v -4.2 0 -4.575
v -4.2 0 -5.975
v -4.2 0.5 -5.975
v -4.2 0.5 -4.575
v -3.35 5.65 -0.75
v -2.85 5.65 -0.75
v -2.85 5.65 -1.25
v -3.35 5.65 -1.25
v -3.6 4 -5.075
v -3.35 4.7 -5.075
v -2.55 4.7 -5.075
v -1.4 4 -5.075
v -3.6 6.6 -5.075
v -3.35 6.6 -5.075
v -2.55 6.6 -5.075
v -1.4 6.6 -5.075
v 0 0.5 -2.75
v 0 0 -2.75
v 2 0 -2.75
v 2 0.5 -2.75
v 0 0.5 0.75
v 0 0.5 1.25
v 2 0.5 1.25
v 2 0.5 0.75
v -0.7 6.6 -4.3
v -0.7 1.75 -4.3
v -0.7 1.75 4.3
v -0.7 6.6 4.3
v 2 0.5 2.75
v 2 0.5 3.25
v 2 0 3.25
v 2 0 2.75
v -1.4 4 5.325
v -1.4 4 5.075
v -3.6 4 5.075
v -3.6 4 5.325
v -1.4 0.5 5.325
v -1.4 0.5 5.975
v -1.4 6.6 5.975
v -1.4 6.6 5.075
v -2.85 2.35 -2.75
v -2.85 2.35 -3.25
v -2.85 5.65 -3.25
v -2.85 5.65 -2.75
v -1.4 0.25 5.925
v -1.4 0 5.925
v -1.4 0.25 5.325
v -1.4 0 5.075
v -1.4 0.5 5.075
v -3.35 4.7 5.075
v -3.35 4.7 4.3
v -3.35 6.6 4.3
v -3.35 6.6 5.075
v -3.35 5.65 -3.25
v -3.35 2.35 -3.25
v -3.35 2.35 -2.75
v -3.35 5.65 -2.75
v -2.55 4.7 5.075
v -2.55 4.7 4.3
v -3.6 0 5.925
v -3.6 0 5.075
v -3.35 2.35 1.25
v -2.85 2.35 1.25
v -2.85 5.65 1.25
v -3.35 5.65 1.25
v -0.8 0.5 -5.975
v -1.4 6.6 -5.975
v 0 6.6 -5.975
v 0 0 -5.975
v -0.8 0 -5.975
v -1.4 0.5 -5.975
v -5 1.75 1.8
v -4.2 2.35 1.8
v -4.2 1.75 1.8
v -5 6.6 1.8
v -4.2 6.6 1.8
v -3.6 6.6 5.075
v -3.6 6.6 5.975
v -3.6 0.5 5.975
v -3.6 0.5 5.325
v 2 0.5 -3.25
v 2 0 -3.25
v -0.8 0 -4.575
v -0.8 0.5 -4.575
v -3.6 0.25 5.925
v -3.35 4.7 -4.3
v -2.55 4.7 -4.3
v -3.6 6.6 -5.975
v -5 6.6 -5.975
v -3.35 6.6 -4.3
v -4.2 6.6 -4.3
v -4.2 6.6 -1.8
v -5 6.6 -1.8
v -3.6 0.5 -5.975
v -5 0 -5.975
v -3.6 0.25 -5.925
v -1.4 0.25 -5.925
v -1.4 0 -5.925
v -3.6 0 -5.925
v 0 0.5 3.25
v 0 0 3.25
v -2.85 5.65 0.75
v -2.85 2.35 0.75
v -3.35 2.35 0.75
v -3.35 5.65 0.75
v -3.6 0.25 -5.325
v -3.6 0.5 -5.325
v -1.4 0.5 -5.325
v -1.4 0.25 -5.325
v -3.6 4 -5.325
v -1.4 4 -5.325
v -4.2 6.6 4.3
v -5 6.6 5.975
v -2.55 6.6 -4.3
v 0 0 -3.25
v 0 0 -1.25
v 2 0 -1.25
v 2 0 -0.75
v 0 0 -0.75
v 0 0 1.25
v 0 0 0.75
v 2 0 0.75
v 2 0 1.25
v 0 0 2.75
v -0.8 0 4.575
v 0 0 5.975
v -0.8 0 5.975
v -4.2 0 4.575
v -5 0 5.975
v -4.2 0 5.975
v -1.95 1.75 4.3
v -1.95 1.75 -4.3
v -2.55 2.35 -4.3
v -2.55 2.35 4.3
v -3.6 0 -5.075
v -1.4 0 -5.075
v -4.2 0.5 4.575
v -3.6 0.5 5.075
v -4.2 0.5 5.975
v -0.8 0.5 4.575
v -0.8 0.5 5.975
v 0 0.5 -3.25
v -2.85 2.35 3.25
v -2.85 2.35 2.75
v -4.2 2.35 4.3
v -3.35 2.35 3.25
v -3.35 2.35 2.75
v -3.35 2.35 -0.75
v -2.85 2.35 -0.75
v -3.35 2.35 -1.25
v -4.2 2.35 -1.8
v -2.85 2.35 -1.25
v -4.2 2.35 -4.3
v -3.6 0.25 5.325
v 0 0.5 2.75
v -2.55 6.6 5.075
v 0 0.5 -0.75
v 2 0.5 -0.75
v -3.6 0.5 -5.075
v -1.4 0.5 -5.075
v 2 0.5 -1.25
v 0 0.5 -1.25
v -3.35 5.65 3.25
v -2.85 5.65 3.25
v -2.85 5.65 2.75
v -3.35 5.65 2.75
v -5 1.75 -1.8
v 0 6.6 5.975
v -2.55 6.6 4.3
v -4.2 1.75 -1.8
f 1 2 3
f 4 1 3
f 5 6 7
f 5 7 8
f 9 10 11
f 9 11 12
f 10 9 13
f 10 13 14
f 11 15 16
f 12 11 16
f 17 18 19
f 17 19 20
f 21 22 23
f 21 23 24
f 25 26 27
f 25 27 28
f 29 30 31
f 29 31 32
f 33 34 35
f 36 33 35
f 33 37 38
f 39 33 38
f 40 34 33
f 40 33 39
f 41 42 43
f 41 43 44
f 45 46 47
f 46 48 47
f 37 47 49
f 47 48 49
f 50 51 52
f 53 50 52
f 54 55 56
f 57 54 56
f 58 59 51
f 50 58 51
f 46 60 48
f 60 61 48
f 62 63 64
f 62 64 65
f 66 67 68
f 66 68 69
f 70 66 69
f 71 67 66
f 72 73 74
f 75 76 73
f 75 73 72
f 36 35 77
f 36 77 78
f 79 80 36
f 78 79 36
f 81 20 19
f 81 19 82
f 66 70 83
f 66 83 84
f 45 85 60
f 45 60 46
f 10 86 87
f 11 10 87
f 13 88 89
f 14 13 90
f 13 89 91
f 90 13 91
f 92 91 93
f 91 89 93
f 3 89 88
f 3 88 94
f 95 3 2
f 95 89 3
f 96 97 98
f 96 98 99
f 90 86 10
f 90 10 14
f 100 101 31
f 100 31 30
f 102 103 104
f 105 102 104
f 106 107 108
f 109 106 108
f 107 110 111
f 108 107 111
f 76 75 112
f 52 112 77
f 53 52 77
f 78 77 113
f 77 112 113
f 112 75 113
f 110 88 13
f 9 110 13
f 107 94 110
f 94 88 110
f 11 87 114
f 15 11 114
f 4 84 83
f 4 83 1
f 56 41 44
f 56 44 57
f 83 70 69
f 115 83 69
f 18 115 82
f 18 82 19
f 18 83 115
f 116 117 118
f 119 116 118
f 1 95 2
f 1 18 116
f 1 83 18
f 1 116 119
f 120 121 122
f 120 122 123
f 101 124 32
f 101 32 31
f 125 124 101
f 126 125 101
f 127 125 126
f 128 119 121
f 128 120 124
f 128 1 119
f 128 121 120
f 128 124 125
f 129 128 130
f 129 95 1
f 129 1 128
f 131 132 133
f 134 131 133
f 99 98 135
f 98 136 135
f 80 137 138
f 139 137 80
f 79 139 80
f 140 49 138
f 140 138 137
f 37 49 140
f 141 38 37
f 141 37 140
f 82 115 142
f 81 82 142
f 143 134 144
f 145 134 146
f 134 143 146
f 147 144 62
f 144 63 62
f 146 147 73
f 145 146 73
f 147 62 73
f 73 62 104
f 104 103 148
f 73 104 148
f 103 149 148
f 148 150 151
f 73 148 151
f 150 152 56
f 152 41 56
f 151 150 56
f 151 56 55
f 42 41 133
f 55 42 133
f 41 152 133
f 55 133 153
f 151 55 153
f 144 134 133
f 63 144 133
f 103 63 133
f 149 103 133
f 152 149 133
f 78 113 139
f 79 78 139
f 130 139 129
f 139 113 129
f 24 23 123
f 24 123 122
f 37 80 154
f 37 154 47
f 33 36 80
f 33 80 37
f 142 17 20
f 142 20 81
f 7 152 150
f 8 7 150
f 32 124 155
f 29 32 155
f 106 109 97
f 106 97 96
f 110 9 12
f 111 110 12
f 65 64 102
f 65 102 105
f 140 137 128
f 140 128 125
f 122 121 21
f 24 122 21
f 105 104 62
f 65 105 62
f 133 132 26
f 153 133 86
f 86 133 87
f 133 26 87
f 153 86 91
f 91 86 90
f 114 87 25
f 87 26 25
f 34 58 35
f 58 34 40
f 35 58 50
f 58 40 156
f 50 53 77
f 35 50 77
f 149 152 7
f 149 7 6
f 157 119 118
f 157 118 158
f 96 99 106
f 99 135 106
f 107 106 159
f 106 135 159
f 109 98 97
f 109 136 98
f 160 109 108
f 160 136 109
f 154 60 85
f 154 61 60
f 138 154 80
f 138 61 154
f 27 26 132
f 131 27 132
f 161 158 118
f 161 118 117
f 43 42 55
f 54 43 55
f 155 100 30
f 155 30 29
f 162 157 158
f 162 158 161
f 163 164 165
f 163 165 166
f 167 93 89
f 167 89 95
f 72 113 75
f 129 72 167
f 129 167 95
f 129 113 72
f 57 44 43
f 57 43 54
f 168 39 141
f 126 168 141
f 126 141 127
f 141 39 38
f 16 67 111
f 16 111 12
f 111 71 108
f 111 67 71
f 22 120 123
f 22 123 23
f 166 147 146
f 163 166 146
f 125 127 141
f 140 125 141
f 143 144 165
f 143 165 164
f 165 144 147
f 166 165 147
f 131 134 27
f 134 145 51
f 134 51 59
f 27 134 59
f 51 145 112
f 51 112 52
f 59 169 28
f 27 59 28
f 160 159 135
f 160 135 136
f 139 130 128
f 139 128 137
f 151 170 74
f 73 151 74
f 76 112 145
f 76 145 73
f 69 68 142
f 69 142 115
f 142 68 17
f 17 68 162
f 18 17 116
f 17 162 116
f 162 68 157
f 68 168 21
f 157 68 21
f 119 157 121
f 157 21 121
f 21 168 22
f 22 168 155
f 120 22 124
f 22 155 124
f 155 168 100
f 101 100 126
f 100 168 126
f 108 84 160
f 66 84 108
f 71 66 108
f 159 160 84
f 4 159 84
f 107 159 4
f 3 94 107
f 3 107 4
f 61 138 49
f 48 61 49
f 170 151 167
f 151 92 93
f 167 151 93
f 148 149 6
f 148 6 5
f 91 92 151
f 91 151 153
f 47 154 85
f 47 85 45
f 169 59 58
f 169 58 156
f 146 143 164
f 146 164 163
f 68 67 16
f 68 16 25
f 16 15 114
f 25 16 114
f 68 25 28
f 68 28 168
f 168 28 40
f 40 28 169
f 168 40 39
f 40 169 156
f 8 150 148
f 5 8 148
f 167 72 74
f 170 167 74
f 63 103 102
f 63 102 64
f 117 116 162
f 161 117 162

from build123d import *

# Parameters (mm, degrees)
SKETCH1_W            = 6.6
SKETCH1_H            = 11.95
BOSS_EXTRUDE1_DEPTH  = 5
SKETCH2_W            = 3.4
SKETCH2_H            = 0.5
CUT_EXTRUDE1_DEPTH   = 1.4
SKETCH3_W            = 2.2
SKETCH3_H            = 0.65
CUT_EXTRUDE2_DEPTH   = 7.1
SKETCH4_W            = 2.2
SKETCH4_H            = 0.25
BOSS_EXTRUDE2_DEPTH  = 0.5
SKETCH5_W            = 2.2
SKETCH5_H            = 0.25
BOSS_EXTRUDE3_DEPTH  = 0.6
SKETCH6_W            = 3.4
SKETCH6_H            = 0.5
CUT_EXTRUDE3_DEPTH   = 1.4
SKETCH7_W            = 2.2
SKETCH7_H            = 0.65
CUT_EXTRUDE4_DEPTH   = 7.1
SKETCH8_W            = 2.2
SKETCH8_H            = 0.25
BOSS_EXTRUDE4_DEPTH  = 0.5
SKETCH9_W            = 2.2
SKETCH9_H            = 0.25
BOSS_EXTRUDE5_DEPTH  = 0.6
CUT_EXTRUDE5_DEPTH   = 3.6
CUT_EXTRUDE6_REACH   = 2.9
SKETCH12_W           = 2.2
SKETCH12_H           = 2.6
CUT_EXTRUDE7_REACH   = 12.275
SKETCH13_W           = 1.85
SKETCH13_H           = 4.85
SKETCH14_W           = 2.5
SKETCH14_H           = 4.25
CUT_EXTRUDE8_DEPTH   = 1.65
CUT_EXTRUDE9_REACH   = 2.9
SKETCH16_W           = 2.2
SKETCH16_H           = 2.6
CUT_EXTRUDE10_REACH  = 12.275
SKETCH17_W           = 1.85
SKETCH17_H           = 4.85
SKETCH18_W           = 2.5
SKETCH18_H           = 4.25
CUT_EXTRUDE11_DEPTH  = 1.65
CUT_EXTRUDE12_REACH  = 6.85
SKETCH20_W           = 0.8
SKETCH20_H           = 3.6
SKETCH21_W           = 0.8
SKETCH21_H           = 1.9
CUT_EXTRUDE13_DEPTH  = 2.675
SKETCH22_W           = 0.8
SKETCH22_H           = 1.9
CUT_EXTRUDE14_DEPTH  = 2.675
SKETCH23_W           = 0.5
SKETCH23_H           = 0.5
BOSS_EXTRUDE6_DEPTH  = 2
SKETCH24_W           = 0.5
SKETCH24_H           = 0.5
BOSS_EXTRUDE7_DEPTH  = 2
SKETCH25_W           = 0.5
SKETCH25_H           = 0.5
BOSS_EXTRUDE8_DEPTH  = 2
SKETCH26_W           = 0.5
SKETCH26_H           = 0.5
BOSS_EXTRUDE9_DEPTH  = 2
SKETCH27_W           = 0.5
SKETCH27_H           = 0.5
BOSS_EXTRUDE10_DEPTH = 3.3
SKETCH28_W           = 0.5
SKETCH28_H           = 0.5
BOSS_EXTRUDE11_DEPTH = 3.3
SKETCH29_W           = 0.5
SKETCH29_H           = 0.5
BOSS_EXTRUDE12_DEPTH = 3.3
SKETCH30_W           = 0.5
SKETCH30_H           = 0.5
BOSS_EXTRUDE13_DEPTH = 3.3
DRAFT1_ANGLE         = 45


with BuildPart() as part:
    # Sketch1 → Boss-Extrude1 (new body)
    with BuildSketch(Plane(origin=(-5, 0, 0), x_dir=(0, -1, 0), z_dir=(-1, 0, 0))):
        with Locations((-3.3, 0)):
            Rectangle(SKETCH1_W, SKETCH1_H)
    extrude(amount=-BOSS_EXTRUDE1_DEPTH)

    # Sketch2 → Cut-Extrude1 (cut)
    with BuildSketch(Plane.XY.offset(5.975)):
        with Locations((-2.5, 0.25)):
            Rectangle(SKETCH2_W, SKETCH2_H)
    extrude(amount=-CUT_EXTRUDE1_DEPTH, mode=Mode.SUBTRACT)

    # Sketch3 → Cut-Extrude2 (cut, through all)
    with BuildSketch(Plane.XZ.offset(-0.5)):
        with Locations((-2.5, 5.65)):
            Rectangle(SKETCH3_W, SKETCH3_H)
    extrude(amount=-CUT_EXTRUDE2_DEPTH, mode=Mode.SUBTRACT)

    # Sketch4 → Boss-Extrude2 (add)
    with BuildSketch(Plane.XZ.offset(-0.5)):
        with Locations((-2.5, 5.2)):
            Rectangle(SKETCH4_W, SKETCH4_H)
    extrude(amount=BOSS_EXTRUDE2_DEPTH)

    # Sketch5 → Boss-Extrude3 (add)
    with BuildSketch(Plane.XY.offset(5.325)):
        with Locations((-2.5, 0.125)):
            Rectangle(SKETCH5_W, SKETCH5_H)
    extrude(amount=BOSS_EXTRUDE3_DEPTH)

    # Sketch6 → Cut-Extrude3 (cut)
    with BuildSketch(Plane(origin=(0, 0, -5.975), x_dir=(-1, 0, 0), z_dir=(0, 0, -1))):
        with Locations((2.5, 0.25)):
            Rectangle(SKETCH6_W, SKETCH6_H)
    extrude(amount=-CUT_EXTRUDE3_DEPTH, mode=Mode.SUBTRACT)

    # Sketch7 → Cut-Extrude4 (cut, through all)
    with BuildSketch(Plane.XZ.offset(-0.5)):
        with Locations((-2.5, -5.65)):
            Rectangle(SKETCH7_W, SKETCH7_H)
    extrude(amount=-CUT_EXTRUDE4_DEPTH, mode=Mode.SUBTRACT)

    # Sketch8 → Boss-Extrude4 (add)
    with BuildSketch(Plane.XZ.offset(-0.5)):
        with Locations((-2.5, -5.2)):
            Rectangle(SKETCH8_W, SKETCH8_H)
    extrude(amount=BOSS_EXTRUDE4_DEPTH)

    # Sketch9 → Boss-Extrude5 (add)
    with BuildSketch(Plane(origin=(0, 0, -5.325), x_dir=(-1, 0, 0), z_dir=(0, 0, -1))):
        with Locations((2.5, 0.125)):
            Rectangle(SKETCH9_W, SKETCH9_H)
    extrude(amount=BOSS_EXTRUDE5_DEPTH)

    # Sketch10 → Cut-Extrude5 (cut)
    with BuildSketch(Plane(origin=(0, 0, -1.8), x_dir=(-1, 0, 0), z_dir=(0, 0, -1))):
        Polygon((5, 2.35), (5, 6.6), (0.7, 6.6), (0.7, 1.75), (2.55, 1.75), (2.55, 2.35), align=None)
    extrude(amount=-CUT_EXTRUDE5_DEPTH, mode=Mode.SUBTRACT)

    # Sketch12 → Cut-Extrude6 (cut, up to next)
    with BuildSketch(Plane(origin=(0, 0, 5.075), x_dir=(-1, 0, 0), z_dir=(0, 0, -1)), mode=Mode.PRIVATE) as cut_extrude6_sk1:
        with Locations((2.5, 5.3)):
            Rectangle(SKETCH12_W, SKETCH12_H)
    cut_extrude6_tool1 = extrude(cut_extrude6_sk1.sketch, amount=-CUT_EXTRUDE6_REACH, mode=Mode.PRIVATE) & part.part
    add(cut_extrude6_tool1.solids().sort_by_distance((-2.5, 5.3, 5.075))[0], mode=Mode.SUBTRACT)

    # Sketch13 → Cut-Extrude7 (cut, up to next)
    with BuildSketch(Plane.XY.offset(4.3), mode=Mode.PRIVATE) as cut_extrude7_sk1:
        with Locations((-1.625, 4.175)):
            Rectangle(SKETCH13_W, SKETCH13_H)
    cut_extrude7_tool1 = extrude(cut_extrude7_sk1.sketch, amount=-CUT_EXTRUDE7_REACH, mode=Mode.PRIVATE) & part.part
    add(cut_extrude7_tool1.solids().sort_by_distance((-1.625, 4.175, 4.3))[0], mode=Mode.SUBTRACT)

    # Sketch14 → Cut-Extrude8 (cut)
    with BuildSketch(Plane(origin=(-2.55, 0, 0), x_dir=(0, 0, -1), z_dir=(1, 0, 0))):
        with Locations((-3.05, 4.475)):
            Rectangle(SKETCH14_W, SKETCH14_H)
    extrude(amount=-CUT_EXTRUDE8_DEPTH, mode=Mode.SUBTRACT)

    # Sketch16 → Cut-Extrude9 (cut, up to next)
    with BuildSketch(Plane.XY.offset(-5.075), mode=Mode.PRIVATE) as cut_extrude9_sk1:
        with Locations((-2.5, 5.3)):
            Rectangle(SKETCH16_W, SKETCH16_H)
    cut_extrude9_tool1 = extrude(cut_extrude9_sk1.sketch, amount=-CUT_EXTRUDE9_REACH, mode=Mode.PRIVATE) & part.part
    add(cut_extrude9_tool1.solids().sort_by_distance((-2.5, 5.3, -5.075))[0], mode=Mode.SUBTRACT)

    # Sketch17 → Cut-Extrude10 (cut, up to next)
    with BuildSketch(Plane(origin=(0, 0, -4.3), x_dir=(-1, 0, 0), z_dir=(0, 0, -1)), mode=Mode.PRIVATE) as cut_extrude10_sk1:
        with Locations((1.625, 4.175)):
            Rectangle(SKETCH17_W, SKETCH17_H)
    cut_extrude10_tool1 = extrude(cut_extrude10_sk1.sketch, amount=-CUT_EXTRUDE10_REACH, mode=Mode.PRIVATE) & part.part
    add(cut_extrude10_tool1.solids().sort_by_distance((-1.625, 4.175, -4.3))[0], mode=Mode.SUBTRACT)

    # Sketch18 → Cut-Extrude11 (cut)
    with BuildSketch(Plane(origin=(-2.55, 0, 0), x_dir=(0, 0, -1), z_dir=(1, 0, 0))):
        with Locations((3.05, 4.475)):
            Rectangle(SKETCH18_W, SKETCH18_H)
    extrude(amount=-CUT_EXTRUDE11_DEPTH, mode=Mode.SUBTRACT)

    # Sketch20 → Cut-Extrude12 (cut, up to next)
    with BuildSketch(Plane.XZ.offset(-1.75), mode=Mode.PRIVATE) as cut_extrude12_sk1:
        with Locations((-4.6, 0)):
            Rectangle(SKETCH20_W, SKETCH20_H)
    cut_extrude12_tool1 = extrude(cut_extrude12_sk1.sketch, amount=-CUT_EXTRUDE12_REACH, mode=Mode.PRIVATE) & part.part
    add(cut_extrude12_tool1.solids().sort_by_distance((-4.6, 1.75, 0))[0], mode=Mode.SUBTRACT)

    # Sketch21 → Cut-Extrude13 (cut, through all)
    with BuildSketch(Plane(origin=(0, 0, 4.3), x_dir=(-1, 0, 0), z_dir=(0, 0, -1))):
        with Locations((2.95, 5.65)):
            Rectangle(SKETCH21_W, SKETCH21_H)
    extrude(amount=-CUT_EXTRUDE13_DEPTH, mode=Mode.SUBTRACT)

    # Sketch22 → Cut-Extrude14 (cut, through all)
    with BuildSketch(Plane.XY.offset(-4.3)):
        with Locations((-2.95, 5.65)):
            Rectangle(SKETCH22_W, SKETCH22_H)
    extrude(amount=-CUT_EXTRUDE14_DEPTH, mode=Mode.SUBTRACT)

    # Sketch23 → Boss-Extrude6 (add)
    with BuildSketch(Plane(origin=(0, 0, 0), x_dir=(0, 0, -1), z_dir=(1, 0, 0))):
        with Locations((-3, 0.25)):
            Rectangle(SKETCH23_W, SKETCH23_H)
    extrude(amount=BOSS_EXTRUDE6_DEPTH)

    # Sketch24 → Boss-Extrude7 (add)
    with BuildSketch(Plane(origin=(0, 0, 0), x_dir=(0, 0, -1), z_dir=(1, 0, 0))):
        with Locations((-1, 0.25)):
            Rectangle(SKETCH24_W, SKETCH24_H)
    extrude(amount=BOSS_EXTRUDE7_DEPTH)

    # Sketch25 → Boss-Extrude8 (add)
    with BuildSketch(Plane(origin=(0, 0, 0), x_dir=(0, 0, -1), z_dir=(1, 0, 0))):
        with Locations((1, 0.25)):
            Rectangle(SKETCH25_W, SKETCH25_H)
    extrude(amount=BOSS_EXTRUDE8_DEPTH)

    # Sketch26 → Boss-Extrude9 (add)
    with BuildSketch(Plane(origin=(0, 0, 0), x_dir=(0, 0, -1), z_dir=(1, 0, 0))):
        with Locations((3, 0.25)):
            Rectangle(SKETCH26_W, SKETCH26_H)
    extrude(amount=BOSS_EXTRUDE9_DEPTH)

    # Sketch27 → Boss-Extrude10 (add)
    with BuildSketch(Plane(origin=(0, 2.35, 0), x_dir=(-1, 0, 0), z_dir=(0, 1, 0))):
        with Locations((3.1, -3)):
            Rectangle(SKETCH27_W, SKETCH27_H)
    extrude(amount=BOSS_EXTRUDE10_DEPTH)

    # Sketch28 → Boss-Extrude11 (add)
    with BuildSketch(Plane(origin=(0, 2.35, 0), x_dir=(-1, 0, 0), z_dir=(0, 1, 0))):
        with Locations((3.1, -1)):
            Rectangle(SKETCH28_W, SKETCH28_H)
    extrude(amount=BOSS_EXTRUDE11_DEPTH)

    # Sketch29 → Boss-Extrude12 (add)
    with BuildSketch(Plane(origin=(0, 2.35, 0), x_dir=(-1, 0, 0), z_dir=(0, 1, 0))):
        with Locations((3.1, 1)):
            Rectangle(SKETCH29_W, SKETCH29_H)
    extrude(amount=BOSS_EXTRUDE12_DEPTH)

    # Sketch30 → Boss-Extrude13 (add)
    with BuildSketch(Plane(origin=(0, 2.35, 0), x_dir=(-1, 0, 0), z_dir=(0, 1, 0))):
        with Locations((3.1, 3)):
            Rectangle(SKETCH30_W, SKETCH30_H)
    extrude(amount=BOSS_EXTRUDE13_DEPTH)

    # Draft1
    draft1_faces = [part.faces().sort_by_distance(p)[0] for p in [
        (-2.55, 2.05, 0),
    ]]
    draft(draft1_faces, Plane(origin=(-2.55, 2.35, 1.8), x_dir=(0, 0, 1), z_dir=(0, 1, 0)), DRAFT1_ANGLE)


solid = part.part
